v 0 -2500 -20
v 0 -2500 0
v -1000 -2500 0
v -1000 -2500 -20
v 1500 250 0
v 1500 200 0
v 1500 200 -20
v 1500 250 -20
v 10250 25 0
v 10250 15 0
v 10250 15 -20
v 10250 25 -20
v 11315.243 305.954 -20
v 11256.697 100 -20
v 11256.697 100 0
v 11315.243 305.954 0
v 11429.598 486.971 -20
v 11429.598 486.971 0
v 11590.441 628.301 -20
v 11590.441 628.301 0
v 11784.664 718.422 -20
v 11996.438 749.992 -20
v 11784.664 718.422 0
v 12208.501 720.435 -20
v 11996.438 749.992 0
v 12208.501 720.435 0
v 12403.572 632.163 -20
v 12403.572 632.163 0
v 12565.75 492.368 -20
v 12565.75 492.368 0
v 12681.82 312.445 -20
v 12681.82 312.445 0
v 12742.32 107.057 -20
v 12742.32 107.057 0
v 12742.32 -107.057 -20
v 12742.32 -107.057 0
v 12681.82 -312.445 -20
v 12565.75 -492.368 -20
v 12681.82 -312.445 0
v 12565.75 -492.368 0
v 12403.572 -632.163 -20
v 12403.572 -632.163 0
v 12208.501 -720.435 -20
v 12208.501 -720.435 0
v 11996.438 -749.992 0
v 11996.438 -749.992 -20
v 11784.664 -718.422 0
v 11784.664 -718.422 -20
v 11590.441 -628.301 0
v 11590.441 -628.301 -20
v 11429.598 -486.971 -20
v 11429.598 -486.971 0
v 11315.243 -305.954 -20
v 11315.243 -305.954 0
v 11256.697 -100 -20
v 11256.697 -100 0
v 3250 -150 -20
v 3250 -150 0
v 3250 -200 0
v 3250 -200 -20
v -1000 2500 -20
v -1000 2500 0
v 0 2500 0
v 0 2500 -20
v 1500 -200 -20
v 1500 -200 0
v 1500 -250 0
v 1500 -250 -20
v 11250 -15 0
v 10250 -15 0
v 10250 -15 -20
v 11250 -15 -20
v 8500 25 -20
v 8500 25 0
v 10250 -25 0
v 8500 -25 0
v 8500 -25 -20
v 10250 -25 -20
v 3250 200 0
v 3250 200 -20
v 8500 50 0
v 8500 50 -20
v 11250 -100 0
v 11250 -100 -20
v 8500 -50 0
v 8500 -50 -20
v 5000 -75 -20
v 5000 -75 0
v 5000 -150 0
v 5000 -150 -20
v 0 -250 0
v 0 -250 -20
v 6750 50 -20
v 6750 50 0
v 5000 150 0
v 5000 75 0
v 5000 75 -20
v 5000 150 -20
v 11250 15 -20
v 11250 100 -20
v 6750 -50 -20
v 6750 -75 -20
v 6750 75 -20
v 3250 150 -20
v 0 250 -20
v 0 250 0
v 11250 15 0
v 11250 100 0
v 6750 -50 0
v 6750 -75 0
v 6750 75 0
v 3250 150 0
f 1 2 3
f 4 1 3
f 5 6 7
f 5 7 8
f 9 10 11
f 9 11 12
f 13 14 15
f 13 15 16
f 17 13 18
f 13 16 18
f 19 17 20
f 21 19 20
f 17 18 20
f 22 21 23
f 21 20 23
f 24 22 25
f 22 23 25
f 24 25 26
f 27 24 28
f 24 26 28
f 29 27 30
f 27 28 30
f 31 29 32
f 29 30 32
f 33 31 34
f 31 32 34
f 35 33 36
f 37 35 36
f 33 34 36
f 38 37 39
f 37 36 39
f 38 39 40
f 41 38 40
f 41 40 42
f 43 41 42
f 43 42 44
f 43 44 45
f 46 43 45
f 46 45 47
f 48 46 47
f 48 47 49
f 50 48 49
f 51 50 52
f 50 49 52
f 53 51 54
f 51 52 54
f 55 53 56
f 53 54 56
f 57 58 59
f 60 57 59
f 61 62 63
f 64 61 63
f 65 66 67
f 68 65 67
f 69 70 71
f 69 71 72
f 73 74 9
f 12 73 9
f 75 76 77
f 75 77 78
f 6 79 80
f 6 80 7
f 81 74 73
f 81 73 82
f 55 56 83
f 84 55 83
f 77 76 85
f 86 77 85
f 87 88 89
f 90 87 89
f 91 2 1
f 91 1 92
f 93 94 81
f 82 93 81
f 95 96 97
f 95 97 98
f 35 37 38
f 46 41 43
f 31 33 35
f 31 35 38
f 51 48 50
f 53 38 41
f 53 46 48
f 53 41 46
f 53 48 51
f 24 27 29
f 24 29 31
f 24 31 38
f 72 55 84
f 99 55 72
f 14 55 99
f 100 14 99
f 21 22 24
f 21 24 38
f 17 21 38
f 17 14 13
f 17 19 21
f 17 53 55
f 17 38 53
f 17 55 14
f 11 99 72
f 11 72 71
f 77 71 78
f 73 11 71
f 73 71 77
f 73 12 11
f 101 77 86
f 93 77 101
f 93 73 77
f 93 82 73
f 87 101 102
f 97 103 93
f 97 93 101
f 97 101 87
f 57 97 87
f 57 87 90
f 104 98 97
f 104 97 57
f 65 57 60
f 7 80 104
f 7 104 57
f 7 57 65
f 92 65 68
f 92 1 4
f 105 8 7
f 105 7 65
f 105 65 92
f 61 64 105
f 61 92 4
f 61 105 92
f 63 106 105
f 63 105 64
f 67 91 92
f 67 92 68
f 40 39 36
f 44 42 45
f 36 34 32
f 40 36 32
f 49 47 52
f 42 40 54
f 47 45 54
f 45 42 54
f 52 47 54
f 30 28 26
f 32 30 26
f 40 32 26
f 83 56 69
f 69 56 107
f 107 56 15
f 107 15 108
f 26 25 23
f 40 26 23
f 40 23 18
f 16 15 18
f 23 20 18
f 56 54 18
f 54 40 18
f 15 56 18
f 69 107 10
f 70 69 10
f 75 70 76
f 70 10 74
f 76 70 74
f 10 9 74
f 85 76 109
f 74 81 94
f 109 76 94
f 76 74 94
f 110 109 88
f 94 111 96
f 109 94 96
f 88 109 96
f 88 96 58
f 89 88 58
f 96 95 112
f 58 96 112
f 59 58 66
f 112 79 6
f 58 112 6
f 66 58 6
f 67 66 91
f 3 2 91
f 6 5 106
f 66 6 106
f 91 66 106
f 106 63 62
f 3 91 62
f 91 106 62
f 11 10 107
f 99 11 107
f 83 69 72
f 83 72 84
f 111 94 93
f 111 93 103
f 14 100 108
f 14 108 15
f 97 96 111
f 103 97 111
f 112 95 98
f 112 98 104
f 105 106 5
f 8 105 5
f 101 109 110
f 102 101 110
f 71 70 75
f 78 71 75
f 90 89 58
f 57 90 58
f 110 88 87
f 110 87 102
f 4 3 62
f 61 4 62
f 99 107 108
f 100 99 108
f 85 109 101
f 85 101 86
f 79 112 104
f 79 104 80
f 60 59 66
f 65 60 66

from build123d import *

# Parameters (mm, degrees)
BOSS_EXTRUDE1_DEPTH = 20
SKETCH2_W           = 1000
SKETCH2_H           = 2250
CUT_EXTRUDE1_DEPTH  = 12993.801853334
CUT_EXTRUDE4_DEPTH  = 12993.801853334
SKETCH4_W           = 1750
SKETCH4_H           = 50
CUT_EXTRUDE5_DEPTH  = 12993.801853334
SKETCH5_W           = 1750
SKETCH5_H           = 75
CUT_EXTRUDE6_DEPTH  = 12993.801853334
SKETCH6_W           = 1750
SKETCH6_H           = 100
CUT_EXTRUDE7_DEPTH  = 12993.801853334
SKETCH7_W           = 1000
SKETCH7_H           = 85
CUT_EXTRUDE8_DEPTH  = 12993.801853334


with BuildPart() as part:
    # Sketch1 → Boss-Extrude1 (new body)
    with BuildSketch(Plane.XY):
        with BuildLine():
            Line((1000, 250), (5000, 250))
            Line((5000, 250), (5000, 125))
            Line((5000, 125), (9000, 125))
            Line((9000, 125), (9000, 100))
            Line((9000, 100), (11256.696562634, 100))
            ThreePointArc((11256.696562634, 100), (12750, 0), (11256.696562634, -100))
            Line((11256.696562634, -100), (9000, -100))
            Line((9000, -100), (9000, -125))
            Line((9000, -125), (5000, -125))
            Line((5000, -125), (5000, -250))
            Line((5000, -250), (1000, -250))
            Line((1000, -250), (1000, -2500))
            Line((1000, -2500), (-1000, -2500))
            Line((-1000, -2500), (-1000, 2500))
            Line((-1000, 2500), (1000, 2500))
            Line((1000, 2500), (1000, 250))
        make_face()
    extrude(amount=-BOSS_EXTRUDE1_DEPTH)

    # Sketch2 → Cut-Extrude1 (cut, through all)
    with BuildSketch(Plane.XY):
        with Locations((500, 1375)):
            Rectangle(SKETCH2_W, SKETCH2_H)
        with Locations((500, -1375)):
            Rectangle(SKETCH2_W, SKETCH2_H)
    extrude(amount=-CUT_EXTRUDE1_DEPTH, mode=Mode.SUBTRACT)

    # Sketch3 → Cut-Extrude4 (cut, through all)
    with BuildSketch(Plane.XY):
        Polygon((1500, -250), (3250, -250), (5000, -250), (5000, -150), (3250, -150), (3250, -200), (1500, -200), align=None)
    cut_extrude4 = extrude(amount=-CUT_EXTRUDE4_DEPTH, mode=Mode.SUBTRACT)

    # Mirror1: Cut-Extrude4 across plane
    add(cut_extrude4.mirror(Plane.ZX), mode=Mode.SUBTRACT)

    # Sketch4 → Cut-Extrude5 (cut, through all)
    with BuildSketch(Plane.XY):
        with Locations((5875, 100)):
            Rectangle(SKETCH4_W, SKETCH4_H)
    cut_extrude5 = extrude(amount=-CUT_EXTRUDE5_DEPTH, mode=Mode.SUBTRACT)

    # Mirror2: Cut-Extrude5 across plane
    add(cut_extrude5.mirror(Plane.ZX), mode=Mode.SUBTRACT)

    # Sketch5 → Cut-Extrude6 (cut, through all)
    with BuildSketch(Plane.XY):
        with Locations((7625, 87.5)):
            Rectangle(SKETCH5_W, SKETCH5_H)
    cut_extrude6 = extrude(amount=-CUT_EXTRUDE6_DEPTH, mode=Mode.SUBTRACT)

    # Mirror3: Cut-Extrude6 across plane
    add(cut_extrude6.mirror(Plane.ZX), mode=Mode.SUBTRACT)

    # Sketch6 → Cut-Extrude7 (cut, through all)
    with BuildSketch(Plane.XY):
        with Locations((9375, 75)):
            Rectangle(SKETCH6_W, SKETCH6_H)
    cut_extrude7 = extrude(amount=-CUT_EXTRUDE7_DEPTH, mode=Mode.SUBTRACT)

    # Mirror4: Cut-Extrude7 across plane
    add(cut_extrude7.mirror(Plane.ZX), mode=Mode.SUBTRACT)

    # Sketch7 → Cut-Extrude8 (cut, through all)
    with BuildSketch(Plane.XY):
        with Locations((10750, 57.5)):
            Rectangle(SKETCH7_W, SKETCH7_H)
    cut_extrude8 = extrude(amount=-CUT_EXTRUDE8_DEPTH, mode=Mode.SUBTRACT)

    # Mirror5: Cut-Extrude8 across plane
    add(cut_extrude8.mirror(Plane.ZX), mode=Mode.SUBTRACT)


solid = part.part
